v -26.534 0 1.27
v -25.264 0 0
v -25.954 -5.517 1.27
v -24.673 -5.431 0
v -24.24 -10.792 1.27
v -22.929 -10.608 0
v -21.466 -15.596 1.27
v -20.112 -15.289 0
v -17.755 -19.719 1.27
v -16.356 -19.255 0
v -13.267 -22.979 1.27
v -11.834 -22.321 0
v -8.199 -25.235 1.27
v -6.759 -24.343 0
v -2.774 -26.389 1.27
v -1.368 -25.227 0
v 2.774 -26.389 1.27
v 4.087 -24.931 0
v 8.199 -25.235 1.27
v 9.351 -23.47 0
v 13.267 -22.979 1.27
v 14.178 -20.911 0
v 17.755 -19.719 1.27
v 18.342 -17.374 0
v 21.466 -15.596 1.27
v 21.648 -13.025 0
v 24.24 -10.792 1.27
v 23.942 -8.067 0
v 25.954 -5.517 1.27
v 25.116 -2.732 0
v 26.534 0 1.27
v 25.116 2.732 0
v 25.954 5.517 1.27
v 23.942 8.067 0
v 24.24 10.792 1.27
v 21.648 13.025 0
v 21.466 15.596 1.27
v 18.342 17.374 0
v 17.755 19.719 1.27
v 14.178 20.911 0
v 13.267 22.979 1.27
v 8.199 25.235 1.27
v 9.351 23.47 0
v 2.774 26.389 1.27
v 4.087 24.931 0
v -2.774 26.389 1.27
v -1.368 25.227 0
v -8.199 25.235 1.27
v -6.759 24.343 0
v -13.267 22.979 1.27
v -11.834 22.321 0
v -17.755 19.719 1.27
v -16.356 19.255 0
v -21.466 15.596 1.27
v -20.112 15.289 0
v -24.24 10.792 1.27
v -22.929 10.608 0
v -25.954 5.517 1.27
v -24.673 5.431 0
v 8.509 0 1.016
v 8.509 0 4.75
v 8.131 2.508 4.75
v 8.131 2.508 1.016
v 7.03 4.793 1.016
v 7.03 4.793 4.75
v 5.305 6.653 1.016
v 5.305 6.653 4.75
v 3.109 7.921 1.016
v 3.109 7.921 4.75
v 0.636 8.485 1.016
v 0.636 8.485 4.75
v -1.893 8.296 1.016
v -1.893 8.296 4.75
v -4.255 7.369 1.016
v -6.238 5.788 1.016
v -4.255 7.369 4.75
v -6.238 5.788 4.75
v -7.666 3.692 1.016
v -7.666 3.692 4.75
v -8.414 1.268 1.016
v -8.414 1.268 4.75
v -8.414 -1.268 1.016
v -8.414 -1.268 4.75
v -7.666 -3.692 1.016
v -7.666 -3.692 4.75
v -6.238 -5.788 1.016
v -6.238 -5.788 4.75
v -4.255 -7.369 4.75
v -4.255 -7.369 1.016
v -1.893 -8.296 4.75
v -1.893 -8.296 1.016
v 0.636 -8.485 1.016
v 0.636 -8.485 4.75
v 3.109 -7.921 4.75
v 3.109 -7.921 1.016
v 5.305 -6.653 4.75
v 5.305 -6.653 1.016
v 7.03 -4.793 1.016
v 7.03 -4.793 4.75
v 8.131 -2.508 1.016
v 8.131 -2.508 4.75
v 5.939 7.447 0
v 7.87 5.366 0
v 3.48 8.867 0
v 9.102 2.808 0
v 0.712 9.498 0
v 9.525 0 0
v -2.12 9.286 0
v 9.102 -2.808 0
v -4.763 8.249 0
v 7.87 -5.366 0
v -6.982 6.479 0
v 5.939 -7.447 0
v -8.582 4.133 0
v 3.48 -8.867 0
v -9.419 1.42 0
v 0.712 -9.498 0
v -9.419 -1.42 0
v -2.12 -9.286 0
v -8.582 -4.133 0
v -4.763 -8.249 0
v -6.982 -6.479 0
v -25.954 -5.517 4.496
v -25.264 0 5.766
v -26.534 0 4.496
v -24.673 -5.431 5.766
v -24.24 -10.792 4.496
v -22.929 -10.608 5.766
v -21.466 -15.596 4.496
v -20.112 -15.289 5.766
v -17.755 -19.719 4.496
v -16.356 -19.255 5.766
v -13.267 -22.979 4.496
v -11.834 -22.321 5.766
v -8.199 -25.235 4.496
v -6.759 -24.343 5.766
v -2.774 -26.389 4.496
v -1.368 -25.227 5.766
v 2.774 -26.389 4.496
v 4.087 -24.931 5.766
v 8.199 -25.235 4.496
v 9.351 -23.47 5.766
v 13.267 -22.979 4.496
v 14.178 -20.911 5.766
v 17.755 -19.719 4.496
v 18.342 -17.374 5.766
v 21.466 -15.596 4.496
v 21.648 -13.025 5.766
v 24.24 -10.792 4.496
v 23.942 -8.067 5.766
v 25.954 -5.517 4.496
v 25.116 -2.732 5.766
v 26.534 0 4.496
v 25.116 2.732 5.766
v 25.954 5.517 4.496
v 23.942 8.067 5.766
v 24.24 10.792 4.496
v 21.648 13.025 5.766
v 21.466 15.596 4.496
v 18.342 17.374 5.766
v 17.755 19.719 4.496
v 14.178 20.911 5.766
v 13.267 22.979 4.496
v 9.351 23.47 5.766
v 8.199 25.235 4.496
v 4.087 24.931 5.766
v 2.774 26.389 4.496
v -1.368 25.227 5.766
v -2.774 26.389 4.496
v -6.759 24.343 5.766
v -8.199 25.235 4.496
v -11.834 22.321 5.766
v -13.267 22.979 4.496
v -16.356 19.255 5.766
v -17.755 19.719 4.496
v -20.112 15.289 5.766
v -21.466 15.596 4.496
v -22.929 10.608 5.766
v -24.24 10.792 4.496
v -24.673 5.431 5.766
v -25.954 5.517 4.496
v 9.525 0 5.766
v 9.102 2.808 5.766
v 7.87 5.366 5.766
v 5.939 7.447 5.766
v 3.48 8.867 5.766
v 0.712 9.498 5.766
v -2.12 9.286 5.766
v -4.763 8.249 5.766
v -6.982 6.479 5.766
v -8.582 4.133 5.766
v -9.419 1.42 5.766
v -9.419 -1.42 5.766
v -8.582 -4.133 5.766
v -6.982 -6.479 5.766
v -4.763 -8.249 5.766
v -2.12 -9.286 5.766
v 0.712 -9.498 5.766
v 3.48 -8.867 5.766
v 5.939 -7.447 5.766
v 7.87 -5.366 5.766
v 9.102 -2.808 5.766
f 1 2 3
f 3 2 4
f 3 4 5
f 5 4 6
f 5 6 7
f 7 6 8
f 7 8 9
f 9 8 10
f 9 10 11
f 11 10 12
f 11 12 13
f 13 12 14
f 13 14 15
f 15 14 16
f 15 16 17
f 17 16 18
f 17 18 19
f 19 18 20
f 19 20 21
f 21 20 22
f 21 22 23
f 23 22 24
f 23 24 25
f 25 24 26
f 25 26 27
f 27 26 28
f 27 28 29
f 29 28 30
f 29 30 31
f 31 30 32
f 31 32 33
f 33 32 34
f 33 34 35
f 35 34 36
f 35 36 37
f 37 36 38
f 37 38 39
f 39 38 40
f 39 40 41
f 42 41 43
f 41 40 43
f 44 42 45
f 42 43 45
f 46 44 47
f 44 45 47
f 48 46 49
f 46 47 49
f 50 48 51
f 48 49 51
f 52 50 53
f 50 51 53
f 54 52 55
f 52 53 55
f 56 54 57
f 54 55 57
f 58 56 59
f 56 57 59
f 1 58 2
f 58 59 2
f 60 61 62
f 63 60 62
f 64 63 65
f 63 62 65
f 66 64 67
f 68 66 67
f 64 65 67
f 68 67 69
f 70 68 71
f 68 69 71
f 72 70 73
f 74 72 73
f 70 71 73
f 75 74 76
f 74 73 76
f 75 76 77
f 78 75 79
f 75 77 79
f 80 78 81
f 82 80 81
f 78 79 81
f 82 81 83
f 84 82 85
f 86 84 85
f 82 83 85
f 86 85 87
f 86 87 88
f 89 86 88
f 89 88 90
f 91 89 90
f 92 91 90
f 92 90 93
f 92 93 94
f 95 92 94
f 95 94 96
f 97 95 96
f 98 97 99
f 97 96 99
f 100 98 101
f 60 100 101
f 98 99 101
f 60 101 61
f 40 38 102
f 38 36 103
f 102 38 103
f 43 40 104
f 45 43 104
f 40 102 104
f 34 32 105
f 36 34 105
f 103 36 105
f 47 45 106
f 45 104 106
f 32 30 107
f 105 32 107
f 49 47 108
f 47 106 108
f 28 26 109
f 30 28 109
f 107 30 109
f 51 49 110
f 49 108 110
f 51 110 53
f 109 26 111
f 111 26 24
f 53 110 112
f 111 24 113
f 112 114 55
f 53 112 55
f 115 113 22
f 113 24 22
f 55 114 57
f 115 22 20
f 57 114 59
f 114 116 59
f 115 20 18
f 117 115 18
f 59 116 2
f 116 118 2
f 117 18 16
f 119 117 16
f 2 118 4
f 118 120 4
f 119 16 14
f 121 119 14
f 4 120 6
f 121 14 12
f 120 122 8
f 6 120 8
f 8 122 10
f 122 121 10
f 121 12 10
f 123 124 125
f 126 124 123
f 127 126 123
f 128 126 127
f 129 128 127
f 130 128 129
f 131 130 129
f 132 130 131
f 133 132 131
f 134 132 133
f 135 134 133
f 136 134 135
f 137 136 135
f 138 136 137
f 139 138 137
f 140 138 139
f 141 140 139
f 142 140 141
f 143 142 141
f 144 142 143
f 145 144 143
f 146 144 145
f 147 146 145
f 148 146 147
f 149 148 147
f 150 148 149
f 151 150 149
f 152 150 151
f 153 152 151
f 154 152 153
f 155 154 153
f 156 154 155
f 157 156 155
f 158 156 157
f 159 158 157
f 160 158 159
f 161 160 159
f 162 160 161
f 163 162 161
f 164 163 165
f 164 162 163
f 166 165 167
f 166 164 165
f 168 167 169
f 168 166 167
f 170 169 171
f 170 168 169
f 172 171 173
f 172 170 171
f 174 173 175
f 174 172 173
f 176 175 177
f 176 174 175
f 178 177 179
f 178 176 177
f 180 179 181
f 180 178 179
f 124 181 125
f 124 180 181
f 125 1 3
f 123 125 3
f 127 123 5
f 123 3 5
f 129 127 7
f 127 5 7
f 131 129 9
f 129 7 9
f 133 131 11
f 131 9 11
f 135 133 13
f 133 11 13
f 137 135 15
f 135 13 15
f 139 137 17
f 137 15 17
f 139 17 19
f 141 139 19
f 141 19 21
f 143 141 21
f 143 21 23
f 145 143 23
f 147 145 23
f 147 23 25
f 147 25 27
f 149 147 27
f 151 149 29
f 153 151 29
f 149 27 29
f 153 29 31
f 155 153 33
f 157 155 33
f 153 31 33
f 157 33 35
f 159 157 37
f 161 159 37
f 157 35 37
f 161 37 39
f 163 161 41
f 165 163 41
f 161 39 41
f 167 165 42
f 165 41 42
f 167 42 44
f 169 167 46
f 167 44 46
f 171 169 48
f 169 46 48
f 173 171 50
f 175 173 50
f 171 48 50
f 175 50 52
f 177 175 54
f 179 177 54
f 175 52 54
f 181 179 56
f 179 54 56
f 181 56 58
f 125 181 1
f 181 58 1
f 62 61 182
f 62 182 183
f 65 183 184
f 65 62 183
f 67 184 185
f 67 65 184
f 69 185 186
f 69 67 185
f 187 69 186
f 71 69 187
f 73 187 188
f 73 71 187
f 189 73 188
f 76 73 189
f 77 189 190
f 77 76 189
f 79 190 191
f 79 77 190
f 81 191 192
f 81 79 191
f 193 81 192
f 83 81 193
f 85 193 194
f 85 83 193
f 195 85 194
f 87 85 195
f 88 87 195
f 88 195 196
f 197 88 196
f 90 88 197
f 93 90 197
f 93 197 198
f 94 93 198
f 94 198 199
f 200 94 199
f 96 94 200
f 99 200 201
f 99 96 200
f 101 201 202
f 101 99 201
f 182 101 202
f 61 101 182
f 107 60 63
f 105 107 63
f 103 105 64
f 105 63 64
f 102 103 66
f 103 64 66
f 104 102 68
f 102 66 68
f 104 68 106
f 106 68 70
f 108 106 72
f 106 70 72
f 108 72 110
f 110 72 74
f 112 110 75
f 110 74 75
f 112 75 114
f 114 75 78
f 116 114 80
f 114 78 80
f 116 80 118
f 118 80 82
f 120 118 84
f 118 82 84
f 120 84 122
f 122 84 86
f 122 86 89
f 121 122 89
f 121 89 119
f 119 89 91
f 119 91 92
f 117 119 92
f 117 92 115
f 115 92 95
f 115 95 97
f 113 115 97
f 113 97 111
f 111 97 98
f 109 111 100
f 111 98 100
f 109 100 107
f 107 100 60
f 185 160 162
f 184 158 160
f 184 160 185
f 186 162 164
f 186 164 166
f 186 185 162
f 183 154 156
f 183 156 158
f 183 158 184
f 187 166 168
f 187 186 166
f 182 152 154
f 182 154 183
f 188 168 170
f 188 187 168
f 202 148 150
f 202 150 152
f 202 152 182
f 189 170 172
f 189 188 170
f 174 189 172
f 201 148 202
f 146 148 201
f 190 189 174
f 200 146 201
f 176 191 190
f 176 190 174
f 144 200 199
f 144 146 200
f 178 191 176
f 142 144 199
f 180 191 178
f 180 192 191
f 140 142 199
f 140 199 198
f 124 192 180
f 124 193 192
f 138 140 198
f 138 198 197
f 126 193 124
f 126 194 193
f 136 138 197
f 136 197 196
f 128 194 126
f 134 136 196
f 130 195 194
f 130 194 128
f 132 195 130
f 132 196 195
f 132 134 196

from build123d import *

# Parameters (mm, degrees)
SKETCH2_R           = 26.533992322
BOSS_EXTRUDE1_DEPTH = 5.7658
CHAMFER1_SIZE       = 1.27
SKETCH3_R           = 8.509
CUT_EXTRUDE1_DEPTH  = 5.7658
CHAMFER2_SIZE       = 1.016


with BuildPart() as part:
    # Sketch2 → Boss-Extrude1 (new body)
    with BuildSketch(Plane.XY):
        with Locations(Location((0, 0, 0), (0, 0, 180))):
            Circle(SKETCH2_R)
    extrude(amount=BOSS_EXTRUDE1_DEPTH)

    # Chamfer1
    chamfer1_edges = [part.edges().sort_by_distance(p)[0] for p in [
        (26.533992322, 0, 0),
        (26.533992322, 0, 5.7658),
    ]]
    chamfer(chamfer1_edges, length=CHAMFER1_SIZE)

    # Sketch3 → Cut-Extrude1 (cut)
    with BuildSketch(Plane.XY.offset(5.7658)):
        Circle(SKETCH3_R)
    extrude(amount=-CUT_EXTRUDE1_DEPTH, mode=Mode.SUBTRACT)

    # Chamfer2
    chamfer2_edges = [part.edges().sort_by_distance(p)[0] for p in [
        (-8.509, 0, 0),
        (-8.509, 0, 5.7658),
    ]]
    chamfer(chamfer2_edges, length=CHAMFER2_SIZE)


solid = part.part
